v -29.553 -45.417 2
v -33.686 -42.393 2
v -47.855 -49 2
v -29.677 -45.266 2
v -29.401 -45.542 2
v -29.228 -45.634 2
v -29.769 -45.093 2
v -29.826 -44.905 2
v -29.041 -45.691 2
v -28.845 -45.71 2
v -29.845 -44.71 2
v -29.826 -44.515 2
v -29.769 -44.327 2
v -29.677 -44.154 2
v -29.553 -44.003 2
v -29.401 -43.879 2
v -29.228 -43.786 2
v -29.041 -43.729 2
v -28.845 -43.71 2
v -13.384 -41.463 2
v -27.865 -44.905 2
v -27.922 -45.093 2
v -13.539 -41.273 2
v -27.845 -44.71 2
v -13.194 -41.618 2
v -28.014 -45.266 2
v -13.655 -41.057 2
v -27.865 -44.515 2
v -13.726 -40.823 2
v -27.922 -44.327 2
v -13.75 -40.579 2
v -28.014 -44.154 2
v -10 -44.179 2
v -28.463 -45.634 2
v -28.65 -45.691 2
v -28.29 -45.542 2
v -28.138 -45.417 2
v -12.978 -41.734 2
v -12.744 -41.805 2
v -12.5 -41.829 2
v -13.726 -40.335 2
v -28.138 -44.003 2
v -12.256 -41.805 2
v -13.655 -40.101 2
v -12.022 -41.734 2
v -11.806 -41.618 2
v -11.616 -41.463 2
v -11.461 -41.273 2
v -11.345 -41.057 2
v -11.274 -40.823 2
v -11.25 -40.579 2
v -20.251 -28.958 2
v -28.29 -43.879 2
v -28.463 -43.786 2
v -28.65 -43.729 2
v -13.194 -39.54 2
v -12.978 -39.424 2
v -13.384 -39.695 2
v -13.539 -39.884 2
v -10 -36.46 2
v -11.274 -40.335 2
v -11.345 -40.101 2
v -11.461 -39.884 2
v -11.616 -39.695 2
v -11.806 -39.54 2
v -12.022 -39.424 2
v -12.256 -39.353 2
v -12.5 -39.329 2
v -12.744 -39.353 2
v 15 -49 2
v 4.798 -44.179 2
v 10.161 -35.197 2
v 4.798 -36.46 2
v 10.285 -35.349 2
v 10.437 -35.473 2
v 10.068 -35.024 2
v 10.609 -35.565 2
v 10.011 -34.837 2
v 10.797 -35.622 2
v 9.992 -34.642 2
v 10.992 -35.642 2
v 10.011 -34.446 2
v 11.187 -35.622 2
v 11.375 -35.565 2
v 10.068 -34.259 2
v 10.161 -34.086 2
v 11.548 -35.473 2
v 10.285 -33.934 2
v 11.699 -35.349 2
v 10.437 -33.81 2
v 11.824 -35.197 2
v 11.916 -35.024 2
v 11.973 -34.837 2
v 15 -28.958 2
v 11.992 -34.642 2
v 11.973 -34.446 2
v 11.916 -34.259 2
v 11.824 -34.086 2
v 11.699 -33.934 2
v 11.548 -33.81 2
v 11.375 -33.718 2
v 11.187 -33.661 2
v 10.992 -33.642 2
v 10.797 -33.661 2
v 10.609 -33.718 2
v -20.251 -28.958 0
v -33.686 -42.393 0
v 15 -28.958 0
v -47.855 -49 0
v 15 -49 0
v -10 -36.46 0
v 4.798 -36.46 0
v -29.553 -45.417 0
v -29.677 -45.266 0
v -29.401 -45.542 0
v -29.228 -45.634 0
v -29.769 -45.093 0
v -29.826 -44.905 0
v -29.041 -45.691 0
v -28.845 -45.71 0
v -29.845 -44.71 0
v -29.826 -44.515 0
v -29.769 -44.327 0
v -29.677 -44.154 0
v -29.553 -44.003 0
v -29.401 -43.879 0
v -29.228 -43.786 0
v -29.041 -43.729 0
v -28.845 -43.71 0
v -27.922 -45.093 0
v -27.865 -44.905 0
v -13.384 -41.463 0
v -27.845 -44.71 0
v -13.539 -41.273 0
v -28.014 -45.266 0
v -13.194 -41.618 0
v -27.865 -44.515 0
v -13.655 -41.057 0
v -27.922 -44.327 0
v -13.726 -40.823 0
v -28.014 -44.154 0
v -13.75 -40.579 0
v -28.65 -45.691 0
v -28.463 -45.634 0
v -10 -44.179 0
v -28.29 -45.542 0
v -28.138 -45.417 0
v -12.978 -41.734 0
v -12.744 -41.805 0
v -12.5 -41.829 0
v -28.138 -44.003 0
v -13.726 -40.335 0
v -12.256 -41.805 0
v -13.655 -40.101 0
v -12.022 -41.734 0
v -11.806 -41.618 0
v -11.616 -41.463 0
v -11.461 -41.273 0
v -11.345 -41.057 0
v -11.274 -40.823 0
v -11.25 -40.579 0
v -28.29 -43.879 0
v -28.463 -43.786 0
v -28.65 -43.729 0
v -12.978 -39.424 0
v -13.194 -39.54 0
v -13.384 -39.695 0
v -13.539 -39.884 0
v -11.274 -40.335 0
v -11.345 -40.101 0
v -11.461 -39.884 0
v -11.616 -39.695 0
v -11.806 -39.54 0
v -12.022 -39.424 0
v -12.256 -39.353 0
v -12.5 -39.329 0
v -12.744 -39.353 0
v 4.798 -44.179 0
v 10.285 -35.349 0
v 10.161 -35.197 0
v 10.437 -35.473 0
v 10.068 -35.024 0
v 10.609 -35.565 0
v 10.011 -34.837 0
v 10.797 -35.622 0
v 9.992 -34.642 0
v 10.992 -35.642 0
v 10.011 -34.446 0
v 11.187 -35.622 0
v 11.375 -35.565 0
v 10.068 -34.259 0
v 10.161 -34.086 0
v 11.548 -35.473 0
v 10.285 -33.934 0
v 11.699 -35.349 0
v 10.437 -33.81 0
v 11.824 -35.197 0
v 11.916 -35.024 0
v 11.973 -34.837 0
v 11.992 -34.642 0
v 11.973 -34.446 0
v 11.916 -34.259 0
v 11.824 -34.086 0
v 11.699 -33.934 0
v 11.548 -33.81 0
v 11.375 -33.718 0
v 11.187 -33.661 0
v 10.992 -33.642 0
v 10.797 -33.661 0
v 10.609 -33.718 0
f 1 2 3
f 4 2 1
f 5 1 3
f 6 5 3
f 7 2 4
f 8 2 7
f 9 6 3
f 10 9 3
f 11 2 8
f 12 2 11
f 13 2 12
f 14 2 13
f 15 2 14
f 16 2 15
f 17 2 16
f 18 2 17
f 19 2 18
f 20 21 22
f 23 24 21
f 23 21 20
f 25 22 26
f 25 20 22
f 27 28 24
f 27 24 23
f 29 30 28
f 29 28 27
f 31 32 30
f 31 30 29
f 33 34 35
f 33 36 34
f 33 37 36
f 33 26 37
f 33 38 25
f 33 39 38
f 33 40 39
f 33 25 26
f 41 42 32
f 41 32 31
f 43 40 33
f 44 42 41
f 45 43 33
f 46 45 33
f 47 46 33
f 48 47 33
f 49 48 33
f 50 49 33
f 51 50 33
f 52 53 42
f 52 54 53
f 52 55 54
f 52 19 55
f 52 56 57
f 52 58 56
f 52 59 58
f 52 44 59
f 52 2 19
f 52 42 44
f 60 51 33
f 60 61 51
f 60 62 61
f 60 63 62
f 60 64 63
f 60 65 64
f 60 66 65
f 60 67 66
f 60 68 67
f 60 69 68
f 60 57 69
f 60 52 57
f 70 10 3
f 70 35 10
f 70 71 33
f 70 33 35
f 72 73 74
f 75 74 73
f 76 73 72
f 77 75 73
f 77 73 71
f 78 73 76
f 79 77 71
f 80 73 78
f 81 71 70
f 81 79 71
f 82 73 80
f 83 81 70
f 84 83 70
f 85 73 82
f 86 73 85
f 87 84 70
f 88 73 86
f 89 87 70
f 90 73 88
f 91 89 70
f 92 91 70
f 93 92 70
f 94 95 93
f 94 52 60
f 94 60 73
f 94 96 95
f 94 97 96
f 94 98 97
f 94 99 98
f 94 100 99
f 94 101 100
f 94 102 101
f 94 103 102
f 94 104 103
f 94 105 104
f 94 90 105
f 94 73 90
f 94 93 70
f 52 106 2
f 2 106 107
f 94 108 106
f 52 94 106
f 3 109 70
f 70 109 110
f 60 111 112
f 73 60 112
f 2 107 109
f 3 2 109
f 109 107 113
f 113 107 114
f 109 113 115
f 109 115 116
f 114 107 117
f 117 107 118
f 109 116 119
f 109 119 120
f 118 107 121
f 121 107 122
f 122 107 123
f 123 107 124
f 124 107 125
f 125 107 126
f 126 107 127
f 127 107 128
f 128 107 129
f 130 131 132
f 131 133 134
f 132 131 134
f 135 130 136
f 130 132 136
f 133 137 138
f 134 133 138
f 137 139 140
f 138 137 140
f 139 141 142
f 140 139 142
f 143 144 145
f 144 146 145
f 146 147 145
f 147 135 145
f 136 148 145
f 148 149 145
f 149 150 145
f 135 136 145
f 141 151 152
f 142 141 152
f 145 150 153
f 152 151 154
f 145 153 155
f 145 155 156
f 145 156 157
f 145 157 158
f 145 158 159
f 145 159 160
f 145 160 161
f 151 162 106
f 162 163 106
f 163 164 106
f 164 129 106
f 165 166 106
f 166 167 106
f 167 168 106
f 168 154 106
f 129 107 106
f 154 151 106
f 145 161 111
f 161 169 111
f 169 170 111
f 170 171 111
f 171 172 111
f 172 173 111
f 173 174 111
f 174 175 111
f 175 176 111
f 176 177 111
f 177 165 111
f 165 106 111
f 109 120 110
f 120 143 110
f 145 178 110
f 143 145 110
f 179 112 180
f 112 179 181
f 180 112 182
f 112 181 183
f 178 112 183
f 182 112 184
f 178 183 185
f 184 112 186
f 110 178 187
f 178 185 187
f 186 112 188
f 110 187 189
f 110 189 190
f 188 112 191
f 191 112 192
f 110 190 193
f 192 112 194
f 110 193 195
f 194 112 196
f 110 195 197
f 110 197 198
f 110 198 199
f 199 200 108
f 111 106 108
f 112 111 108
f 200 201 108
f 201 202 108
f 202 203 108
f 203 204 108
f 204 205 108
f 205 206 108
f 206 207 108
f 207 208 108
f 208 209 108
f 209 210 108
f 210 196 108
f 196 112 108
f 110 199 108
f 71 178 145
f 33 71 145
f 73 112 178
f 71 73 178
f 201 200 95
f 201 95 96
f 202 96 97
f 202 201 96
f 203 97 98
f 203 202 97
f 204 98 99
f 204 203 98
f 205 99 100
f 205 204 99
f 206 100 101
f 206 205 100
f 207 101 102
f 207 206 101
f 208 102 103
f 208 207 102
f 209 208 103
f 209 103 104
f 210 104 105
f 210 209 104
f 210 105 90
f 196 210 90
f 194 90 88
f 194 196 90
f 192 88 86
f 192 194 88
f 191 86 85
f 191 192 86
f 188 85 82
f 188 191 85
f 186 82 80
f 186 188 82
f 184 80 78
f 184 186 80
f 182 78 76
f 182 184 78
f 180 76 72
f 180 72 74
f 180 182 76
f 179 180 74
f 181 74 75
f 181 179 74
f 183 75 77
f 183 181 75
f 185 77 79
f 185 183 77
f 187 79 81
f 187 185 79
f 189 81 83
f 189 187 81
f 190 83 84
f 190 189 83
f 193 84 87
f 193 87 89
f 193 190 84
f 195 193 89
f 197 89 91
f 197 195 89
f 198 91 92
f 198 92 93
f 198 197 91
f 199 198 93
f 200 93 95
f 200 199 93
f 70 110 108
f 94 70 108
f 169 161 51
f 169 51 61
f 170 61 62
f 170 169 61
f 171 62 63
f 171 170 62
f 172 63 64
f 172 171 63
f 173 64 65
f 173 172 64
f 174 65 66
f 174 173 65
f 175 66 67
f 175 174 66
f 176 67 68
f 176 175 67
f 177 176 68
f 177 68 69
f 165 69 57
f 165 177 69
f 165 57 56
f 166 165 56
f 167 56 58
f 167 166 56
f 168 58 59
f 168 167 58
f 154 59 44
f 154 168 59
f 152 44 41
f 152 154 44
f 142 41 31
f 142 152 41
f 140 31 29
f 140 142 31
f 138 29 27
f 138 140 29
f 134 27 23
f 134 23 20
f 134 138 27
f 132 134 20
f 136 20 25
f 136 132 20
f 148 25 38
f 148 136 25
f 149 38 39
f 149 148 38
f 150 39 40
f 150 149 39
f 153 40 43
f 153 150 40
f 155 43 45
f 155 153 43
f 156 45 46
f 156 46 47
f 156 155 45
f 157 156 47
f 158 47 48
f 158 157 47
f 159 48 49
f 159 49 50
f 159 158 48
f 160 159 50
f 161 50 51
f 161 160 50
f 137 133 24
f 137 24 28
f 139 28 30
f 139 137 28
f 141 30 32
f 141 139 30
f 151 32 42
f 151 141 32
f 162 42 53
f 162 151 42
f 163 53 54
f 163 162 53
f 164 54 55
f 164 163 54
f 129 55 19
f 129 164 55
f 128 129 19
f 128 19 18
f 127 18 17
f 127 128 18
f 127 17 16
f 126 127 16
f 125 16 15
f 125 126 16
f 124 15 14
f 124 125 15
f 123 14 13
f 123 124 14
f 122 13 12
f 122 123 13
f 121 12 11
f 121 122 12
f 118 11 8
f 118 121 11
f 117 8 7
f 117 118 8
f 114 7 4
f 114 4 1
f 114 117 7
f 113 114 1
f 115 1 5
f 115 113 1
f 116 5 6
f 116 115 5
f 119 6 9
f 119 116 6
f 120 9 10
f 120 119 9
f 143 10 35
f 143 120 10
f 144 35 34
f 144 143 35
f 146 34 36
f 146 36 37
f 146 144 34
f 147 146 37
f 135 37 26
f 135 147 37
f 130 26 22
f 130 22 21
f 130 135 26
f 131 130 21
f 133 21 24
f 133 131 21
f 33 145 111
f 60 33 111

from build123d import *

# Parameters (mm, degrees)
SKETCH_1_R      = 1.25
SKETCH_1_R_2    = 1
EXTRUDE_1_DEPTH = 2


with BuildPart() as part:
    # Эскиз1 → Бобышка-Вытянуть1 (new body)
    with BuildSketch(Plane.XY):
        Polygon((15, -49), (15, -28.957842446), (-20.251430991, -28.957842446), (-33.686459833, -42.392871289), (-47.855493079, -49), align=None)
        with Locations((-12.5, -40.578921223)):
            Circle(SKETCH_1_R, mode=Mode.SUBTRACT)
        with Locations((-28.845458385, -44.710050328)):
            Circle(SKETCH_1_R_2, mode=Mode.SUBTRACT)
        with Locations((10.992087761, -34.64156265)):
            Circle(SKETCH_1_R_2, mode=Mode.SUBTRACT)
        Polygon((-10, -36.459984998), (4.798276813, -36.459984998), (4.798276813, -43.678921223), (4.798276813, -44.178921223), (-10, -44.178921223), (-10, -43.678921223), align=None, mode=Mode.SUBTRACT)
    extrude(amount=EXTRUDE_1_DEPTH)


solid = part.part
